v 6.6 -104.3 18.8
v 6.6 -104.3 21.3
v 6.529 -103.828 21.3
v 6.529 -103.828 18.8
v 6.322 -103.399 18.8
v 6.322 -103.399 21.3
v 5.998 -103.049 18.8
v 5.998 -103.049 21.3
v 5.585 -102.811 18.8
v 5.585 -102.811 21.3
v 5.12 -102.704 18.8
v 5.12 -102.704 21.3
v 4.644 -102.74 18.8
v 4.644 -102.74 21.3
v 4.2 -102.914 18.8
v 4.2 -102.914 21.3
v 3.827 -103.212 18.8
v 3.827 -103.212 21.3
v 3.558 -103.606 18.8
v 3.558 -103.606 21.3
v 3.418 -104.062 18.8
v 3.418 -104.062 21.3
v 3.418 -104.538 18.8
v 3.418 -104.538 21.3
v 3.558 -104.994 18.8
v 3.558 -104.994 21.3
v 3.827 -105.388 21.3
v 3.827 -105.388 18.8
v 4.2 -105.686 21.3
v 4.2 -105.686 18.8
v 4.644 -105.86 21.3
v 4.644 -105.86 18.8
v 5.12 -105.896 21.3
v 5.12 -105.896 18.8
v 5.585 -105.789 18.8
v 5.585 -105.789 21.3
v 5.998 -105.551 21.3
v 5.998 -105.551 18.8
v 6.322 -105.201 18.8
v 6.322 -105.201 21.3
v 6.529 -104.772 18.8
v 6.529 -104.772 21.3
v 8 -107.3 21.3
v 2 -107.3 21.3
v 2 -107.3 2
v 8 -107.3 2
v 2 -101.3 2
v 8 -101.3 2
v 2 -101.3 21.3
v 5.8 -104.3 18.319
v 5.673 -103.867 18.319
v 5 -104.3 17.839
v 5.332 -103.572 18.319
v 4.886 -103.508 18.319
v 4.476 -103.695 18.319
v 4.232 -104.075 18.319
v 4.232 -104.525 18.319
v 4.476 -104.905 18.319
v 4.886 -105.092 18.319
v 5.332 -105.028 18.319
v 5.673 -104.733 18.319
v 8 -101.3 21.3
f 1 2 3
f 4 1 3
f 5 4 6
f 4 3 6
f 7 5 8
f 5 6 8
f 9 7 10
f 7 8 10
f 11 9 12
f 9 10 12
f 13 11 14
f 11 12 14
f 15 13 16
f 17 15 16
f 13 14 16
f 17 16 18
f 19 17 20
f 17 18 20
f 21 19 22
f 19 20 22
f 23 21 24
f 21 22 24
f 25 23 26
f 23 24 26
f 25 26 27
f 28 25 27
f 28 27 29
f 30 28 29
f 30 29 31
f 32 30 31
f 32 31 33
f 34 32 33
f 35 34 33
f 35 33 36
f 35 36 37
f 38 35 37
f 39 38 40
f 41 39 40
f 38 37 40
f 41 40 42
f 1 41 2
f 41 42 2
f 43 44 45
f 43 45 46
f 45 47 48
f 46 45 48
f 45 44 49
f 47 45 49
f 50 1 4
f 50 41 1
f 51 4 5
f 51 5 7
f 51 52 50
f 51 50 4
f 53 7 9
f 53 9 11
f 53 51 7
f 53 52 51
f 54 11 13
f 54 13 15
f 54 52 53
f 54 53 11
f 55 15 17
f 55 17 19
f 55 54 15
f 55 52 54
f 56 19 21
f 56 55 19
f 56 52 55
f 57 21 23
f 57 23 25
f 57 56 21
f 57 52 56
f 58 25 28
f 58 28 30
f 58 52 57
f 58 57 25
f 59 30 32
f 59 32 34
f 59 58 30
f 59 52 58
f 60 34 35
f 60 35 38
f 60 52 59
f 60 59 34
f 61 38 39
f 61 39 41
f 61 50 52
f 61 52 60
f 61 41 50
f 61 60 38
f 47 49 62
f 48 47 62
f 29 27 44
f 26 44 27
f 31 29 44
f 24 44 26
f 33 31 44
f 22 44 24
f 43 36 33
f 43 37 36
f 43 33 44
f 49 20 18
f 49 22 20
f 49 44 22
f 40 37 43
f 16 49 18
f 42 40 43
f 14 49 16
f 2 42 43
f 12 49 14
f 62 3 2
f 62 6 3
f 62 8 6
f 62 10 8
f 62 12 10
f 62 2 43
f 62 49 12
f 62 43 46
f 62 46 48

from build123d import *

# Parameters (mm, degrees)
SKETCH095_W      = 6
SKETCH095_H      = 6
EXTRUDE033_DEPTH = 19.3
SKETCH096_R      = 1.6
HOLE019_DEPTH    = 2.5
HOLE019_TIPS_R   = 1.6


with BuildPart() as part:
    # Sketch095 (on Face6 of BaseFeature009) → Extrude033 (new body)
    with BuildSketch(Plane.XY.offset(2)):
        with Locations((5, -104.299998)):
            Rectangle(SKETCH095_W, SKETCH095_H)
    extrude(amount=EXTRUDE033_DEPTH)

    # Sketch096 (on Face6 of Extrude033) → Hole019 (cut)
    with BuildSketch(Plane.XY.offset(21.3)):
        with Locations((5, -104.300002)):
            Circle(SKETCH096_R)
    extrude(amount=-HOLE019_DEPTH, mode=Mode.SUBTRACT)

    # Hole019 tips → Hole019 tip 1 section 0
    with BuildSketch(Plane.XY.offset(18.8), mode=Mode.PRIVATE) as hole019_tip_1_s0:
        with Locations((5, -104.300002)):
            Circle(HOLE019_TIPS_R)
    loft([hole019_tip_1_s0.sketch, Vertex(5, -104.300002, 17.838623)], mode=Mode.SUBTRACT)


solid = part.part
